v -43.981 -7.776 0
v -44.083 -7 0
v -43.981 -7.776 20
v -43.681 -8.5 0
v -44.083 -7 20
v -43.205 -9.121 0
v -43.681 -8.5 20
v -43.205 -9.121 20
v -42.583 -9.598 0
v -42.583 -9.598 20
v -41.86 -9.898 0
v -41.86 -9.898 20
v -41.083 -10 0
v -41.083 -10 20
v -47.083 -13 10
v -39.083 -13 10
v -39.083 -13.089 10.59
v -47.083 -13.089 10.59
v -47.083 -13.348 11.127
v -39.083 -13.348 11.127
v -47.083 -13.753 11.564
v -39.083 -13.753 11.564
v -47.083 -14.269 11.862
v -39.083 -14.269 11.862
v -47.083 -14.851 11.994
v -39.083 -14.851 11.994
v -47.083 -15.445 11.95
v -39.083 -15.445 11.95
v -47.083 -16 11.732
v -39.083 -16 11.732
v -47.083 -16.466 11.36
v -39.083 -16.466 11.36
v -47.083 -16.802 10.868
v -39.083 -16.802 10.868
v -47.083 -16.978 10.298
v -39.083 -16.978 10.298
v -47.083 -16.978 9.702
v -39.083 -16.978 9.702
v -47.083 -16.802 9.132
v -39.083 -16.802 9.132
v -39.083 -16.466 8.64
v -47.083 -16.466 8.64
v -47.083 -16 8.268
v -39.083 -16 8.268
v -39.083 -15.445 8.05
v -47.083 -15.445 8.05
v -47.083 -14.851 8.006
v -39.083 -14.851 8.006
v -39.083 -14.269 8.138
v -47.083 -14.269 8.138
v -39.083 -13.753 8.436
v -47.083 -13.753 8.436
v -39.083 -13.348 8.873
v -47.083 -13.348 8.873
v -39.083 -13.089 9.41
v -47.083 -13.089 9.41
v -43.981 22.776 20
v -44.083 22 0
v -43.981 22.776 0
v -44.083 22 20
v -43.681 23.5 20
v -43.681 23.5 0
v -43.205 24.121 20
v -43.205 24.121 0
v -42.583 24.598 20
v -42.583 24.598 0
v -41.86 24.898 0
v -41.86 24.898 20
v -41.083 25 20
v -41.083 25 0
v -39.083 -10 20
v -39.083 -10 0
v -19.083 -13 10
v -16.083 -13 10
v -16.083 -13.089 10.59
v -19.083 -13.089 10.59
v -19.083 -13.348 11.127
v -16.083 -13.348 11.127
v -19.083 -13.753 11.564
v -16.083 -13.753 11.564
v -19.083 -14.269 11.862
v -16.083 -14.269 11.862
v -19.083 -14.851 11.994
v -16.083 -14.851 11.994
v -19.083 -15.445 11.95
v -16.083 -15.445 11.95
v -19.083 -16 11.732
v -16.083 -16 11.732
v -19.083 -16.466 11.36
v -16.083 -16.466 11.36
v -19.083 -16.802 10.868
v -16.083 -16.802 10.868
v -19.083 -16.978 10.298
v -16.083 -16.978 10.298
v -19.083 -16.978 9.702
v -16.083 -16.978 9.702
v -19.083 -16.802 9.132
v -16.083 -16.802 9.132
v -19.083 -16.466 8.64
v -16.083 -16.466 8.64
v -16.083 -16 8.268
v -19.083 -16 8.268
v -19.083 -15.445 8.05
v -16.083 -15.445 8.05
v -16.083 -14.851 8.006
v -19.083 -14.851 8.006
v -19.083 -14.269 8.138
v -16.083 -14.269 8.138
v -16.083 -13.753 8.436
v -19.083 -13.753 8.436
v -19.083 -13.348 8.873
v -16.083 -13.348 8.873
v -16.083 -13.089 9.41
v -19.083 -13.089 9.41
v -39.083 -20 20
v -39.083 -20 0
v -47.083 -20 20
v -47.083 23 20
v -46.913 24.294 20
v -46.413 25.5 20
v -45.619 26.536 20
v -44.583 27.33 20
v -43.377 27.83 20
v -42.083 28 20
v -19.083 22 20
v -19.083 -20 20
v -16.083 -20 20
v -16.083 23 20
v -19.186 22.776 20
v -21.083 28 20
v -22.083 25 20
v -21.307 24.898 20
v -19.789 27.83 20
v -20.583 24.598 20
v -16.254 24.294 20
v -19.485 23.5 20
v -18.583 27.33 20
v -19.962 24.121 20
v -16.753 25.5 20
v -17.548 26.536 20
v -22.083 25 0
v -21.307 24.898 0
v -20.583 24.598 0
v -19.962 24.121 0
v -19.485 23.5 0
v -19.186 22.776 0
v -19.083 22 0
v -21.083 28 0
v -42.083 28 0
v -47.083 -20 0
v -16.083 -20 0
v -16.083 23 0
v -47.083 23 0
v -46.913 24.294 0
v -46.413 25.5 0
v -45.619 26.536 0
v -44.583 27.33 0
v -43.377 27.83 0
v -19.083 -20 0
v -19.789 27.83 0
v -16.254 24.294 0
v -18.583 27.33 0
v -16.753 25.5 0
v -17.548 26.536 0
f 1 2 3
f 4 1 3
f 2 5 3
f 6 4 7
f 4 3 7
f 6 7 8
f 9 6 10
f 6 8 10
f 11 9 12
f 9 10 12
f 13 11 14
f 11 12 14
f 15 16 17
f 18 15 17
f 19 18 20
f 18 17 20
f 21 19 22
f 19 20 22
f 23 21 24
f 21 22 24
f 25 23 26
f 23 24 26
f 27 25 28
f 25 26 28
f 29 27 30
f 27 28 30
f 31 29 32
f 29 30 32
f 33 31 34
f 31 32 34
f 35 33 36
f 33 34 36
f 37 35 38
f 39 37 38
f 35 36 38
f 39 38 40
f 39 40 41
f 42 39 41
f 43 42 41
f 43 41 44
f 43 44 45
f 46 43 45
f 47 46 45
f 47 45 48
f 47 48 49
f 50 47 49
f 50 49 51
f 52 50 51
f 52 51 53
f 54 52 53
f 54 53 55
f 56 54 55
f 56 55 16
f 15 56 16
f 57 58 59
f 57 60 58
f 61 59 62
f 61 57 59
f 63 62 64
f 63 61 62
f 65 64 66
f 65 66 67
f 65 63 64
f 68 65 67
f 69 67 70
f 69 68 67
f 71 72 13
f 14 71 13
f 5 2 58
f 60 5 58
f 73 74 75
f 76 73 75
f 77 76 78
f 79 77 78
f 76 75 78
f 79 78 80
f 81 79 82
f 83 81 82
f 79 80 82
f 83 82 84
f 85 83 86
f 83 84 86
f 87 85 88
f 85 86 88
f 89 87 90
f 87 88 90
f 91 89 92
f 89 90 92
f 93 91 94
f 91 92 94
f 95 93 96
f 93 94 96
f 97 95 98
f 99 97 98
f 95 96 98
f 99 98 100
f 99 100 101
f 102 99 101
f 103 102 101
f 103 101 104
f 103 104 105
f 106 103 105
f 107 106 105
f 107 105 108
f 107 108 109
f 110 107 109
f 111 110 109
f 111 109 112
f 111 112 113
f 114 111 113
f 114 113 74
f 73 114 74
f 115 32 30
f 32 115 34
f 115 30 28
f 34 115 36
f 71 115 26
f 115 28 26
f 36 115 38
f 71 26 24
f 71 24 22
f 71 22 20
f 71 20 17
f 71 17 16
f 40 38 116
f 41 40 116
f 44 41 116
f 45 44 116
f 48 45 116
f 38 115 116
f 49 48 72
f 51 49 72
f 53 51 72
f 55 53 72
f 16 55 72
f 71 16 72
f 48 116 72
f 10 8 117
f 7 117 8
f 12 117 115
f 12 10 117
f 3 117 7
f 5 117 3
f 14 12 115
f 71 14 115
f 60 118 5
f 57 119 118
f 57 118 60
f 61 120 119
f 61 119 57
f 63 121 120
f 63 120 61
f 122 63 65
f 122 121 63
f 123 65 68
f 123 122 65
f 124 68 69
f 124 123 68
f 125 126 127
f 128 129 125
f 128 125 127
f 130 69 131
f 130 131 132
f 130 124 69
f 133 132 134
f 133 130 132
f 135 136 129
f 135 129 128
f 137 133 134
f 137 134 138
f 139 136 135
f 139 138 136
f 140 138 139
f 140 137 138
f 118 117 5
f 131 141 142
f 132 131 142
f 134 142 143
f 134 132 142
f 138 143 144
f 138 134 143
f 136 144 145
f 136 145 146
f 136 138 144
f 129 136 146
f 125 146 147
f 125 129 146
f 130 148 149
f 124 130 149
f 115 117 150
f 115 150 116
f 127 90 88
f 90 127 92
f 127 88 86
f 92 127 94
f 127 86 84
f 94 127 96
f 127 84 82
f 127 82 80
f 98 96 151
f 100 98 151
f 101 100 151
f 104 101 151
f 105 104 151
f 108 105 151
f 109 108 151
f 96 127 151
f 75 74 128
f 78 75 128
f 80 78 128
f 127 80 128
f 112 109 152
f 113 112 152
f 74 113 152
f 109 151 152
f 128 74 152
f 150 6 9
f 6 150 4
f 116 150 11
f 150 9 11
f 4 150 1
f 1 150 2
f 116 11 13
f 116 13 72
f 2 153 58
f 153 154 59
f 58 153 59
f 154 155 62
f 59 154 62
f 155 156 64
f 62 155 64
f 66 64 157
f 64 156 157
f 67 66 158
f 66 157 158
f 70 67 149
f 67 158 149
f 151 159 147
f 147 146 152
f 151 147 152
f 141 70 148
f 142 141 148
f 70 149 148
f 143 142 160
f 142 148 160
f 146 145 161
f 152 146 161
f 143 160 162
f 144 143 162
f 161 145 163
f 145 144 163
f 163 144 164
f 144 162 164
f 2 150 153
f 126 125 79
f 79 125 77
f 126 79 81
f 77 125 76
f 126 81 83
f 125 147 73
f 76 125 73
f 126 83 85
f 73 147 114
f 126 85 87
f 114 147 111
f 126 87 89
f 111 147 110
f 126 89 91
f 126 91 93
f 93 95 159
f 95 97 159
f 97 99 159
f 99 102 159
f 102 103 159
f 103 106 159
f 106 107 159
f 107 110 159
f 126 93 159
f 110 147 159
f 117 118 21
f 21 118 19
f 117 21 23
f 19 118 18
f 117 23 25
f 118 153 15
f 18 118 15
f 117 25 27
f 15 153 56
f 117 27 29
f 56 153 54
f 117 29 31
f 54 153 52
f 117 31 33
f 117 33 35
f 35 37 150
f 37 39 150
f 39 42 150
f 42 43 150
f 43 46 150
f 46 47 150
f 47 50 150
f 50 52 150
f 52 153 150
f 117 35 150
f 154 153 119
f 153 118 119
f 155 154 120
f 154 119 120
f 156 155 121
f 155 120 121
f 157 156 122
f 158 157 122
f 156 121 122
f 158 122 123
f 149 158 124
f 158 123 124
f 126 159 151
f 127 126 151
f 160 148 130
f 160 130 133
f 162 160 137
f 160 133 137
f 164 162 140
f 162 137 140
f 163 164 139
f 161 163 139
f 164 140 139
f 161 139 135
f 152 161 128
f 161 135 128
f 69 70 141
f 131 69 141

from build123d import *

# Parameters (mm, degrees)
F0_W     = 25
F0_H     = 3
F0_W_2   = 3
F0_H_2   = 20
F1_DEPTH = 20
F3_D     = 4
F3_DEPTH = 120
F4_R     = 3
F5_R     = 5


with BuildPart() as f1:
    # F0 (on Top) → F1 (new body)
    with BuildSketch(Plane.XY):
        Polygon((-44.083337, -10), (-44.083337, 0), (-47.083337, 0), (-47.083337, -20), (-39.083337, -20), (-39.083337, -10), align=None)
        Polygon((-47.083337, 0), (-44.083337, 0), (-44.083337, 25), (-44.083337, 28), (-47.083337, 28), align=None)
        with Locations((-31.583337, 26.5)):
            Rectangle(F0_W, F0_H)
        Polygon((-19.083337, 25), (-19.083337, 0), (-16.083337, 0), (-16.083337, 28), (-19.083337, 28), align=None)
        with Locations((-17.583337, -10)):
            Rectangle(F0_W_2, F0_H_2)
    extrude(amount=F1_DEPTH)

    # F3
    with Locations(Plane(origin=(-47.083337, 0, 0), x_dir=(0, -1, 0), z_dir=(-1, 0, 0))):
        with Locations((15, 10)):
            Hole(F3_D / 2, depth=F3_DEPTH)

    # F4
    f4_edges = [f1.edges().sort_by_distance(p)[0] for p in [
        (-19.083337, 25, 10),
        (-44.083337, 25, 10),
        (-44.083337, -10, 10),
    ]]
    fillet(f4_edges, radius=F4_R)

    # F5
    f5_edges = [f1.edges().sort_by_distance(p)[0] for p in [
        (-47.083337, 28, 10),
        (-16.083337, 28, 10),
    ]]
    fillet(f5_edges, radius=F5_R)


solid = f1.part
